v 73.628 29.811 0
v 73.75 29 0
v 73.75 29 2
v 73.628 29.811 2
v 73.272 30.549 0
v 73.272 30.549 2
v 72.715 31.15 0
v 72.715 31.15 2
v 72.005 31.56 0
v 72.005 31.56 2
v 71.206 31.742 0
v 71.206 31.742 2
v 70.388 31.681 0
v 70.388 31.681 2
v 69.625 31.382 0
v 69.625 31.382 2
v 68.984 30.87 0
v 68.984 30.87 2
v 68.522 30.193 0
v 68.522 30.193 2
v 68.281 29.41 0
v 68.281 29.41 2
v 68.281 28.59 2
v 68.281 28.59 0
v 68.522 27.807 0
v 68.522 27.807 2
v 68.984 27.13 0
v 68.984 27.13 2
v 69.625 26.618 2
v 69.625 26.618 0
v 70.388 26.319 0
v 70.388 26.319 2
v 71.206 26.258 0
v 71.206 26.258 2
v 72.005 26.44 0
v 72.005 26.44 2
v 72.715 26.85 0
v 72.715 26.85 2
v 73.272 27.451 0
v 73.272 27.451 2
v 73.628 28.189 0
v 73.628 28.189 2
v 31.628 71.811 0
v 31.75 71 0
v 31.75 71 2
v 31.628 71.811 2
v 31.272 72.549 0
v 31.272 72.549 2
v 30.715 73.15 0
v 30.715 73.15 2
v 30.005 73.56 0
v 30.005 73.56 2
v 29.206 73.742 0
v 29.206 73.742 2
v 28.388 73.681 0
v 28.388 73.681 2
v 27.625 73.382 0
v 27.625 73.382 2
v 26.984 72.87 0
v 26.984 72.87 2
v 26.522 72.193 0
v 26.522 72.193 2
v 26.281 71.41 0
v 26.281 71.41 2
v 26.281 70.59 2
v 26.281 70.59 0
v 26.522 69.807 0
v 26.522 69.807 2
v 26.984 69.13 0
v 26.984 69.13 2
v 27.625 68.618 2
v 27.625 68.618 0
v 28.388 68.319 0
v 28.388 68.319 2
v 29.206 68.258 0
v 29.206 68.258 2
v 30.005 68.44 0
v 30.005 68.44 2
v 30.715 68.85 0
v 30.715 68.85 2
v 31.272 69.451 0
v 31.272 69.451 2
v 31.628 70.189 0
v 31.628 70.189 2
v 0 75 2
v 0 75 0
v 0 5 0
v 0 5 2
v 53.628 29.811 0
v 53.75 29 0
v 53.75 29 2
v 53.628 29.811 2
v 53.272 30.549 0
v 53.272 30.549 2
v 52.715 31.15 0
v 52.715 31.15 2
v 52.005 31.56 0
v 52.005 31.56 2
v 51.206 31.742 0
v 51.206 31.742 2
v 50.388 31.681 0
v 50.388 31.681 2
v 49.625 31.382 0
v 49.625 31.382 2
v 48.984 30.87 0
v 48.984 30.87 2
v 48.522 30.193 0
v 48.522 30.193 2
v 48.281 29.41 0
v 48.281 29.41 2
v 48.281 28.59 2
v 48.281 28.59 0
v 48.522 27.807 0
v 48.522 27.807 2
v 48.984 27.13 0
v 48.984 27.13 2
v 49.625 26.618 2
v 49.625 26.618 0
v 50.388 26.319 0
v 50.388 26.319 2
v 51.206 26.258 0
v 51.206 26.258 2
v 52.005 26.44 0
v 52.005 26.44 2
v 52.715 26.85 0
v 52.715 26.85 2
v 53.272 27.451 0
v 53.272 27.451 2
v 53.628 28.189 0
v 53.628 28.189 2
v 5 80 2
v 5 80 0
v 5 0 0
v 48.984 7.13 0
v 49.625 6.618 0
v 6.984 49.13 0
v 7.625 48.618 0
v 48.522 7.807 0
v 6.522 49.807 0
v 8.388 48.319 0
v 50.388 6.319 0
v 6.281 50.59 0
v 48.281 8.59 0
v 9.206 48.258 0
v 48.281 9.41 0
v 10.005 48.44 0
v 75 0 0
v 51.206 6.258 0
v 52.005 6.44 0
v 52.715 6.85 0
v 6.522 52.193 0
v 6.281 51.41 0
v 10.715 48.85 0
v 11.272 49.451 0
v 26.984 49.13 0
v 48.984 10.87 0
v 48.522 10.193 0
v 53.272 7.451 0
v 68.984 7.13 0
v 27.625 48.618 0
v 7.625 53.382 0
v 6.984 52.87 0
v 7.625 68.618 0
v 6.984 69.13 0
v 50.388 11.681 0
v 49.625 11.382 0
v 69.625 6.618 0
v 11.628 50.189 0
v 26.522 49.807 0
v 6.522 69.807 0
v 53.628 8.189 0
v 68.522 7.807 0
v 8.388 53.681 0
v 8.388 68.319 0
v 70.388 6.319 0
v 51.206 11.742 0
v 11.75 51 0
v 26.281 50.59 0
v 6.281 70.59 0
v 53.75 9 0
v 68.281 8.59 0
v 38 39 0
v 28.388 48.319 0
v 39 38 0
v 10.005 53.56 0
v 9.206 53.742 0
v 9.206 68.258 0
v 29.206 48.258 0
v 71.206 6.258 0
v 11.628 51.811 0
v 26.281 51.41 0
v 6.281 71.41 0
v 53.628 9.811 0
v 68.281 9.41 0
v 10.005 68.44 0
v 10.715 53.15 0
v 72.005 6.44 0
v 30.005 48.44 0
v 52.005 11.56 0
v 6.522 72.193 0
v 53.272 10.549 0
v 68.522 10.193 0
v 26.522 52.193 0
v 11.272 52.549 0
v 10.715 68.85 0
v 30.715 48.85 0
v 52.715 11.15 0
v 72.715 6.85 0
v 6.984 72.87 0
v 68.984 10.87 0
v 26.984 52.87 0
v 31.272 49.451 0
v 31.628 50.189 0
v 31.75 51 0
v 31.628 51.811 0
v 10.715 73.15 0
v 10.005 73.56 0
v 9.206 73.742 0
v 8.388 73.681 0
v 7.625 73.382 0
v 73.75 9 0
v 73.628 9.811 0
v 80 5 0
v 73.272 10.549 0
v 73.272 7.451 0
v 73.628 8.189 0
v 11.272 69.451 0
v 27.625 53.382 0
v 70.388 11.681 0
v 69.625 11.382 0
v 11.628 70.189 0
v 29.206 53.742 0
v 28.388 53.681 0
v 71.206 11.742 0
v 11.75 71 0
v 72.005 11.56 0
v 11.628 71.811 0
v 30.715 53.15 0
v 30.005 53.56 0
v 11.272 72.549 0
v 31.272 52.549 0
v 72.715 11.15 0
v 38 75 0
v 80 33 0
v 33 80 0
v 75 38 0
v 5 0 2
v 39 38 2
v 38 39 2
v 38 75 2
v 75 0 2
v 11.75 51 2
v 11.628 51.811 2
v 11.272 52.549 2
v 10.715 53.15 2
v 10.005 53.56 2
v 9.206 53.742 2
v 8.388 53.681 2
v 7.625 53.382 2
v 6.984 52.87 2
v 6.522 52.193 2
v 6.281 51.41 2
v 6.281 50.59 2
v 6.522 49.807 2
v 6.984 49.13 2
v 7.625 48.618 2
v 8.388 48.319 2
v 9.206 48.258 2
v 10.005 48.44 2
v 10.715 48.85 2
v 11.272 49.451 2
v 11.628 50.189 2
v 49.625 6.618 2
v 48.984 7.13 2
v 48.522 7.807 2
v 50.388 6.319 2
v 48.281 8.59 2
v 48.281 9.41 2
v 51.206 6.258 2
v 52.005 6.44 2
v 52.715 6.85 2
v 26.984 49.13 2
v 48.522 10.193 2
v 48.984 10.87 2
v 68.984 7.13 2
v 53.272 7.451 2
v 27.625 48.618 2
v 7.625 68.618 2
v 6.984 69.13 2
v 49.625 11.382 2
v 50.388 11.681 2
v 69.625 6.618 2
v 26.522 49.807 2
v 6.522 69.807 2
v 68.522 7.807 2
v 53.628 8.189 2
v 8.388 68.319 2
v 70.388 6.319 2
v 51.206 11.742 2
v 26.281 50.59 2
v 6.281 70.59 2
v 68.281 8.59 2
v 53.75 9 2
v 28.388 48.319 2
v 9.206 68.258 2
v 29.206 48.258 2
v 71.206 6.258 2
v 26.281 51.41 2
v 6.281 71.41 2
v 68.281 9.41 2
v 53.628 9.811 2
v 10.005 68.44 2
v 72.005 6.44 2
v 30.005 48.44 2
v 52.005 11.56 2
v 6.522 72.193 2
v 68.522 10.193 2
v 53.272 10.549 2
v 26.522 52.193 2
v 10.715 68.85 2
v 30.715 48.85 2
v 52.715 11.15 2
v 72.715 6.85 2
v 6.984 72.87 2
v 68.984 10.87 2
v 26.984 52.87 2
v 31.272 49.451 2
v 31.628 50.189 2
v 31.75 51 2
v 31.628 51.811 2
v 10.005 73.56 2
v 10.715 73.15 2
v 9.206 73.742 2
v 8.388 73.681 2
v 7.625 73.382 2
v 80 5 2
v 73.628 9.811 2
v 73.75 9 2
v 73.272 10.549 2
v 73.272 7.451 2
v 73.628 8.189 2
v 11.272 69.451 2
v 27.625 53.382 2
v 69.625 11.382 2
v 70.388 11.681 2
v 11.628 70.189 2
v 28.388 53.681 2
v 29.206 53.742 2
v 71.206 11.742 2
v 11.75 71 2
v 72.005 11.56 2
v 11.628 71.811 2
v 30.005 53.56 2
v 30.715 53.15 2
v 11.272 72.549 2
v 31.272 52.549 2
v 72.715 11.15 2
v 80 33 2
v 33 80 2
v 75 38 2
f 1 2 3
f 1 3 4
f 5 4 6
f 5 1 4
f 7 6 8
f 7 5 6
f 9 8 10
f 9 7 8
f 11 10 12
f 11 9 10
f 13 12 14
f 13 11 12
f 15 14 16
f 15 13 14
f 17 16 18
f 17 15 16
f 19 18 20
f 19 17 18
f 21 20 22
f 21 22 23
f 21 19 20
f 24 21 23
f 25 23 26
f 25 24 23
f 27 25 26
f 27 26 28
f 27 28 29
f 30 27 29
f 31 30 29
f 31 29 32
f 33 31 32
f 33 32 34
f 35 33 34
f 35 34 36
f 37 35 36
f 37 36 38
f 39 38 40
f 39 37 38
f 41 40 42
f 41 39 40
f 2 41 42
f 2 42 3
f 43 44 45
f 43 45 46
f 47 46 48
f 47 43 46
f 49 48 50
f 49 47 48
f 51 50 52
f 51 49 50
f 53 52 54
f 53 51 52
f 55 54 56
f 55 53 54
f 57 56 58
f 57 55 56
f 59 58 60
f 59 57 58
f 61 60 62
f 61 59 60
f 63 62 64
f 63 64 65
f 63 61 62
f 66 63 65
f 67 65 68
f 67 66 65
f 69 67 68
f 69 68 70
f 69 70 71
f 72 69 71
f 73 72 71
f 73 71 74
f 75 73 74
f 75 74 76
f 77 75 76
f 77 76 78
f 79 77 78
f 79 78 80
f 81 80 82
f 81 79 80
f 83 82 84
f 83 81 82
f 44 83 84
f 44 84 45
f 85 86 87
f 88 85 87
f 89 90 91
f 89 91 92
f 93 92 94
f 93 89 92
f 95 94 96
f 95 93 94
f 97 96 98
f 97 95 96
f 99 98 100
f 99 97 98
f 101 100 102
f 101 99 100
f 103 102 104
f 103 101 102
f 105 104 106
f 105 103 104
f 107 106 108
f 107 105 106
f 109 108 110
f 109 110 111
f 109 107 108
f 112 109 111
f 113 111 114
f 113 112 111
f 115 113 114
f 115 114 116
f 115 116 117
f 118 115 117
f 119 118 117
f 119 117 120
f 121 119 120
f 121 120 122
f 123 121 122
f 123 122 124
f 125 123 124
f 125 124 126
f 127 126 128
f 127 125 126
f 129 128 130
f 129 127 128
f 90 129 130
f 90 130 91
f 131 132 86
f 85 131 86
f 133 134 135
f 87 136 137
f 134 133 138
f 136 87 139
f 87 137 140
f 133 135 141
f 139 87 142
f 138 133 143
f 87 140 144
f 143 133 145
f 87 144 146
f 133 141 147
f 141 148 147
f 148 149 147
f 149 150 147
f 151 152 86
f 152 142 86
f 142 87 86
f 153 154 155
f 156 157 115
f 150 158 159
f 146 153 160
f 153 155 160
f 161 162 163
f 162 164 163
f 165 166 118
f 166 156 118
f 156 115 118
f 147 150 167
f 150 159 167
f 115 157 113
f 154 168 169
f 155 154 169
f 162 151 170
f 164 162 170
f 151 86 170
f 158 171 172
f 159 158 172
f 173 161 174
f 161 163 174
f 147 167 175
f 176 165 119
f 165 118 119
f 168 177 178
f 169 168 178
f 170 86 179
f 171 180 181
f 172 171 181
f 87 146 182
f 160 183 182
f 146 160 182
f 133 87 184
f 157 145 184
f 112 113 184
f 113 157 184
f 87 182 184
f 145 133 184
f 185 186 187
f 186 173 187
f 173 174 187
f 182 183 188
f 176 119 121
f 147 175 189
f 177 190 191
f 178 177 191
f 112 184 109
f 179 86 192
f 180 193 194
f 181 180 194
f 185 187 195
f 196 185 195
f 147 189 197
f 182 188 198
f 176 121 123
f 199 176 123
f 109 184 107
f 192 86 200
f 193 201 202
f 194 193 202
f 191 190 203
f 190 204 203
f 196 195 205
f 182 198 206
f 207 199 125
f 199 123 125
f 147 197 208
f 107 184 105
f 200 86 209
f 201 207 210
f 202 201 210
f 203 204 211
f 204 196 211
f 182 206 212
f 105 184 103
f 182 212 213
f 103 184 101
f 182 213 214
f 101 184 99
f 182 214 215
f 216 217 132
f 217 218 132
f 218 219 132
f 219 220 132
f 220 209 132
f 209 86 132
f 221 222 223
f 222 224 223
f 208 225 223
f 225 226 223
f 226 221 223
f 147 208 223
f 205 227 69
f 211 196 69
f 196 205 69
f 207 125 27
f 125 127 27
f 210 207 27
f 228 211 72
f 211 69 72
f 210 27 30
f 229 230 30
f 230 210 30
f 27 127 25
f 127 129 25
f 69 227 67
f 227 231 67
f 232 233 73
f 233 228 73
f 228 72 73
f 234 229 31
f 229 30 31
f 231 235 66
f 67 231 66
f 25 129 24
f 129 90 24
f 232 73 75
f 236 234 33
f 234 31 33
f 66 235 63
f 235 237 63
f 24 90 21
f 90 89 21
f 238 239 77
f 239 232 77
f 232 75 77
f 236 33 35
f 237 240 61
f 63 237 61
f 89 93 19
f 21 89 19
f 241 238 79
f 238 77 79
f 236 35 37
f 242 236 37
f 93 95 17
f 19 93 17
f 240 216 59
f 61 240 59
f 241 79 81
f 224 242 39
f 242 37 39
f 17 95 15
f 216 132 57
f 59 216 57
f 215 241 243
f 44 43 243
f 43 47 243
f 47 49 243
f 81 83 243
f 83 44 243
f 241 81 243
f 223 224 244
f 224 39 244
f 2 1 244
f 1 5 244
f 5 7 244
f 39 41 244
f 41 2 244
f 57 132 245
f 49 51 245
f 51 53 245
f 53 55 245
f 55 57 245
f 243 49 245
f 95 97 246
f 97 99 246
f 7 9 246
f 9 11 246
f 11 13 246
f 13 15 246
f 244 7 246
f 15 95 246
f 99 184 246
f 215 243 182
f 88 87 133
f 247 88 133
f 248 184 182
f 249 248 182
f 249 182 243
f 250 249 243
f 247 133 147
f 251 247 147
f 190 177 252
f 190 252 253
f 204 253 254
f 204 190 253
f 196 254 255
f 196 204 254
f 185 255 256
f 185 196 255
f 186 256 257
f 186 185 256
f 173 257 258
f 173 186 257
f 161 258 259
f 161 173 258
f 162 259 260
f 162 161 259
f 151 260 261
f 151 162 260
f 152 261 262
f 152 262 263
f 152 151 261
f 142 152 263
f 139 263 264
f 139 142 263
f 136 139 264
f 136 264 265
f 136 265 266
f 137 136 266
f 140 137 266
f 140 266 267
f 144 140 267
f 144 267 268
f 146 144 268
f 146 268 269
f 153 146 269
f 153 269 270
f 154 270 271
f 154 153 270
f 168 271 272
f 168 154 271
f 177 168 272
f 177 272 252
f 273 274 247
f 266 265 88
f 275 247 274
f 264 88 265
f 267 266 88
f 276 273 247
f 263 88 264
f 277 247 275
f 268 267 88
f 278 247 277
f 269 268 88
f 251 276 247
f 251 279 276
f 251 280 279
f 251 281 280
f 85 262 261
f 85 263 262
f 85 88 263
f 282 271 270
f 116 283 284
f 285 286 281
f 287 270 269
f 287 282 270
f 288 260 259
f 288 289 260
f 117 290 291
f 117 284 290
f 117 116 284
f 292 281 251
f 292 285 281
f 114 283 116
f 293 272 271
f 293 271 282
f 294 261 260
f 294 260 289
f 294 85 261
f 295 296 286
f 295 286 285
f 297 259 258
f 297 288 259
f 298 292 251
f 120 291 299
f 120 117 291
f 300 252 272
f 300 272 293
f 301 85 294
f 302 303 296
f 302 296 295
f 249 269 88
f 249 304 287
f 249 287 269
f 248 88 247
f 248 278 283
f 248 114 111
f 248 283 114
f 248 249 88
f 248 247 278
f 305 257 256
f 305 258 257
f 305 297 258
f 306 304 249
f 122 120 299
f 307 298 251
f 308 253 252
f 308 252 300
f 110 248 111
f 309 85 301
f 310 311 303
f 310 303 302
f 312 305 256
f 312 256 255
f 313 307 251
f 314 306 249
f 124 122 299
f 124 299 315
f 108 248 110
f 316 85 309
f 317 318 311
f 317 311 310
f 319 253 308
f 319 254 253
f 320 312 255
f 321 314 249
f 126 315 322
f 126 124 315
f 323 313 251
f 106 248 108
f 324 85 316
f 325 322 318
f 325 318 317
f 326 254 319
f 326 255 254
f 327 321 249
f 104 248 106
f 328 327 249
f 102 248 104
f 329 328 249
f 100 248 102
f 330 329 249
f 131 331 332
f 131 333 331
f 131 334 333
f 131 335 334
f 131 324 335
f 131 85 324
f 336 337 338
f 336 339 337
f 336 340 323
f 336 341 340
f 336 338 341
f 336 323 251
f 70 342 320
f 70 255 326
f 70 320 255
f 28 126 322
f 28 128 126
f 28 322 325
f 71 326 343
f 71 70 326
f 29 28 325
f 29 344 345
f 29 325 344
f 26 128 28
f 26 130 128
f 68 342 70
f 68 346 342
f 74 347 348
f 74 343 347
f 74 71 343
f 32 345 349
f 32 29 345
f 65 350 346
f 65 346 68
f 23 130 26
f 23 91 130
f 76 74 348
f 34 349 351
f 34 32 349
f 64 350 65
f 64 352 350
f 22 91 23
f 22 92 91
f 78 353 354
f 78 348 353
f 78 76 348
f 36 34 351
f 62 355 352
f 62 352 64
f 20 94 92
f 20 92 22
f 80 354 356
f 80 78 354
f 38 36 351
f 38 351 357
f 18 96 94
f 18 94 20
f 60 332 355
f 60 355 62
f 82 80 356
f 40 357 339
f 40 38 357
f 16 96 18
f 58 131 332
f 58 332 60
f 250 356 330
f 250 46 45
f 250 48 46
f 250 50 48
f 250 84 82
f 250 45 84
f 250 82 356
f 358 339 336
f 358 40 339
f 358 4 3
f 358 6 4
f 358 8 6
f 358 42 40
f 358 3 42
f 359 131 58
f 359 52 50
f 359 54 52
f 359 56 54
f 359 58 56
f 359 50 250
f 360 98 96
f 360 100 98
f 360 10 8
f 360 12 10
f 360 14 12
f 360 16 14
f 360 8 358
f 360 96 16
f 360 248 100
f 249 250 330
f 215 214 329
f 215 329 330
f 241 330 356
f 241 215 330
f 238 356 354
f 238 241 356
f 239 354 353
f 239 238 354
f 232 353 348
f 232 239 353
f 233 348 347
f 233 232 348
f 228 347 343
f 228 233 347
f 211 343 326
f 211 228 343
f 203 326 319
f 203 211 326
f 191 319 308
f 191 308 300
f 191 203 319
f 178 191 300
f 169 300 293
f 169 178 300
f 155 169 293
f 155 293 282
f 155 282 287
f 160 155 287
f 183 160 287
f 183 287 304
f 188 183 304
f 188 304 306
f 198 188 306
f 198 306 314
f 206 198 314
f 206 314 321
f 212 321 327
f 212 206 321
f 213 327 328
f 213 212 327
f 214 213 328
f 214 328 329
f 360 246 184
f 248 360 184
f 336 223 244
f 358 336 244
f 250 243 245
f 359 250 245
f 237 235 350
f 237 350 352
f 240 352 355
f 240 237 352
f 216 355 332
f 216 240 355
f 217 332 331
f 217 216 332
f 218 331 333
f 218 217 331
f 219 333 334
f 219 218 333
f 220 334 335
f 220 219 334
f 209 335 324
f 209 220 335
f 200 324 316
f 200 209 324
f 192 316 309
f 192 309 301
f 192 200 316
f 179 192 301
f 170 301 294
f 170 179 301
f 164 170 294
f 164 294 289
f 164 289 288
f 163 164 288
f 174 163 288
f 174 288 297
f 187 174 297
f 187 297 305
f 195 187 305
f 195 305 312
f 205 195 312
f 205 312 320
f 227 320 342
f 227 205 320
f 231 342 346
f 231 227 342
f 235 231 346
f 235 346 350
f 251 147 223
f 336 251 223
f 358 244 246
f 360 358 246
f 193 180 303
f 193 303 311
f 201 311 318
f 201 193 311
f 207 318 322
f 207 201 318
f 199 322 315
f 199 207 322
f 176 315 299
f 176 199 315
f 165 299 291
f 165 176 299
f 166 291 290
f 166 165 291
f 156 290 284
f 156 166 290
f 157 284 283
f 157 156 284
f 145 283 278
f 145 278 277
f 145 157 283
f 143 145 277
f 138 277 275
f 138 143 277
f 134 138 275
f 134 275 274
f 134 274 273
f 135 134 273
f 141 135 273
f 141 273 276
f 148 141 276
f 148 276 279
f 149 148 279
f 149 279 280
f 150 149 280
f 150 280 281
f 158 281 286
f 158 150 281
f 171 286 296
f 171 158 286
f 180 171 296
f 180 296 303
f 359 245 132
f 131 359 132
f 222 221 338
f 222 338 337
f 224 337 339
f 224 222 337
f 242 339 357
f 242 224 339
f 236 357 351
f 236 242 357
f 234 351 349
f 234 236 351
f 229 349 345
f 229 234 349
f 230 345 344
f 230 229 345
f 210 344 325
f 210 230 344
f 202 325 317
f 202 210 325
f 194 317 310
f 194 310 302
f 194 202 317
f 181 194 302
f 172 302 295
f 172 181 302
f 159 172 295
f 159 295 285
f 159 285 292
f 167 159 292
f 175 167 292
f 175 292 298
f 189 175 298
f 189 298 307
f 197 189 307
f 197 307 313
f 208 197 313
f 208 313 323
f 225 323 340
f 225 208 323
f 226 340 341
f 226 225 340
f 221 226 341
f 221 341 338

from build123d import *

# Parameters (mm, degrees)
SKETCH1_R           = 2.75
BOSS_EXTRUDE1_DEPTH = 2


with BuildPart() as part:
    # Sketch1 → Boss-Extrude1 (new body)
    with BuildSketch(Plane.XY):
        Polygon((5, 0), (38, 0), (75, 0), (80, 5), (80, 33), (75, 38), (39, 38), (38, 39), (38, 75), (33, 80), (5, 80), (0, 75), (0, 5), align=None)
        with Locations((9, 71)):
            Circle(SKETCH1_R, mode=Mode.SUBTRACT)
        with Locations((29, 71)):
            Circle(SKETCH1_R, mode=Mode.SUBTRACT)
        with Locations((29, 51)):
            Circle(SKETCH1_R, mode=Mode.SUBTRACT)
        with Locations((9, 51)):
            Circle(SKETCH1_R, mode=Mode.SUBTRACT)
        with Locations((51, 29)):
            Circle(SKETCH1_R, mode=Mode.SUBTRACT)
        with Locations((71, 29)):
            Circle(SKETCH1_R, mode=Mode.SUBTRACT)
        with Locations((71, 9)):
            Circle(SKETCH1_R, mode=Mode.SUBTRACT)
        with Locations((51, 9)):
            Circle(SKETCH1_R, mode=Mode.SUBTRACT)
    extrude(amount=BOSS_EXTRUDE1_DEPTH)


solid = part.part
